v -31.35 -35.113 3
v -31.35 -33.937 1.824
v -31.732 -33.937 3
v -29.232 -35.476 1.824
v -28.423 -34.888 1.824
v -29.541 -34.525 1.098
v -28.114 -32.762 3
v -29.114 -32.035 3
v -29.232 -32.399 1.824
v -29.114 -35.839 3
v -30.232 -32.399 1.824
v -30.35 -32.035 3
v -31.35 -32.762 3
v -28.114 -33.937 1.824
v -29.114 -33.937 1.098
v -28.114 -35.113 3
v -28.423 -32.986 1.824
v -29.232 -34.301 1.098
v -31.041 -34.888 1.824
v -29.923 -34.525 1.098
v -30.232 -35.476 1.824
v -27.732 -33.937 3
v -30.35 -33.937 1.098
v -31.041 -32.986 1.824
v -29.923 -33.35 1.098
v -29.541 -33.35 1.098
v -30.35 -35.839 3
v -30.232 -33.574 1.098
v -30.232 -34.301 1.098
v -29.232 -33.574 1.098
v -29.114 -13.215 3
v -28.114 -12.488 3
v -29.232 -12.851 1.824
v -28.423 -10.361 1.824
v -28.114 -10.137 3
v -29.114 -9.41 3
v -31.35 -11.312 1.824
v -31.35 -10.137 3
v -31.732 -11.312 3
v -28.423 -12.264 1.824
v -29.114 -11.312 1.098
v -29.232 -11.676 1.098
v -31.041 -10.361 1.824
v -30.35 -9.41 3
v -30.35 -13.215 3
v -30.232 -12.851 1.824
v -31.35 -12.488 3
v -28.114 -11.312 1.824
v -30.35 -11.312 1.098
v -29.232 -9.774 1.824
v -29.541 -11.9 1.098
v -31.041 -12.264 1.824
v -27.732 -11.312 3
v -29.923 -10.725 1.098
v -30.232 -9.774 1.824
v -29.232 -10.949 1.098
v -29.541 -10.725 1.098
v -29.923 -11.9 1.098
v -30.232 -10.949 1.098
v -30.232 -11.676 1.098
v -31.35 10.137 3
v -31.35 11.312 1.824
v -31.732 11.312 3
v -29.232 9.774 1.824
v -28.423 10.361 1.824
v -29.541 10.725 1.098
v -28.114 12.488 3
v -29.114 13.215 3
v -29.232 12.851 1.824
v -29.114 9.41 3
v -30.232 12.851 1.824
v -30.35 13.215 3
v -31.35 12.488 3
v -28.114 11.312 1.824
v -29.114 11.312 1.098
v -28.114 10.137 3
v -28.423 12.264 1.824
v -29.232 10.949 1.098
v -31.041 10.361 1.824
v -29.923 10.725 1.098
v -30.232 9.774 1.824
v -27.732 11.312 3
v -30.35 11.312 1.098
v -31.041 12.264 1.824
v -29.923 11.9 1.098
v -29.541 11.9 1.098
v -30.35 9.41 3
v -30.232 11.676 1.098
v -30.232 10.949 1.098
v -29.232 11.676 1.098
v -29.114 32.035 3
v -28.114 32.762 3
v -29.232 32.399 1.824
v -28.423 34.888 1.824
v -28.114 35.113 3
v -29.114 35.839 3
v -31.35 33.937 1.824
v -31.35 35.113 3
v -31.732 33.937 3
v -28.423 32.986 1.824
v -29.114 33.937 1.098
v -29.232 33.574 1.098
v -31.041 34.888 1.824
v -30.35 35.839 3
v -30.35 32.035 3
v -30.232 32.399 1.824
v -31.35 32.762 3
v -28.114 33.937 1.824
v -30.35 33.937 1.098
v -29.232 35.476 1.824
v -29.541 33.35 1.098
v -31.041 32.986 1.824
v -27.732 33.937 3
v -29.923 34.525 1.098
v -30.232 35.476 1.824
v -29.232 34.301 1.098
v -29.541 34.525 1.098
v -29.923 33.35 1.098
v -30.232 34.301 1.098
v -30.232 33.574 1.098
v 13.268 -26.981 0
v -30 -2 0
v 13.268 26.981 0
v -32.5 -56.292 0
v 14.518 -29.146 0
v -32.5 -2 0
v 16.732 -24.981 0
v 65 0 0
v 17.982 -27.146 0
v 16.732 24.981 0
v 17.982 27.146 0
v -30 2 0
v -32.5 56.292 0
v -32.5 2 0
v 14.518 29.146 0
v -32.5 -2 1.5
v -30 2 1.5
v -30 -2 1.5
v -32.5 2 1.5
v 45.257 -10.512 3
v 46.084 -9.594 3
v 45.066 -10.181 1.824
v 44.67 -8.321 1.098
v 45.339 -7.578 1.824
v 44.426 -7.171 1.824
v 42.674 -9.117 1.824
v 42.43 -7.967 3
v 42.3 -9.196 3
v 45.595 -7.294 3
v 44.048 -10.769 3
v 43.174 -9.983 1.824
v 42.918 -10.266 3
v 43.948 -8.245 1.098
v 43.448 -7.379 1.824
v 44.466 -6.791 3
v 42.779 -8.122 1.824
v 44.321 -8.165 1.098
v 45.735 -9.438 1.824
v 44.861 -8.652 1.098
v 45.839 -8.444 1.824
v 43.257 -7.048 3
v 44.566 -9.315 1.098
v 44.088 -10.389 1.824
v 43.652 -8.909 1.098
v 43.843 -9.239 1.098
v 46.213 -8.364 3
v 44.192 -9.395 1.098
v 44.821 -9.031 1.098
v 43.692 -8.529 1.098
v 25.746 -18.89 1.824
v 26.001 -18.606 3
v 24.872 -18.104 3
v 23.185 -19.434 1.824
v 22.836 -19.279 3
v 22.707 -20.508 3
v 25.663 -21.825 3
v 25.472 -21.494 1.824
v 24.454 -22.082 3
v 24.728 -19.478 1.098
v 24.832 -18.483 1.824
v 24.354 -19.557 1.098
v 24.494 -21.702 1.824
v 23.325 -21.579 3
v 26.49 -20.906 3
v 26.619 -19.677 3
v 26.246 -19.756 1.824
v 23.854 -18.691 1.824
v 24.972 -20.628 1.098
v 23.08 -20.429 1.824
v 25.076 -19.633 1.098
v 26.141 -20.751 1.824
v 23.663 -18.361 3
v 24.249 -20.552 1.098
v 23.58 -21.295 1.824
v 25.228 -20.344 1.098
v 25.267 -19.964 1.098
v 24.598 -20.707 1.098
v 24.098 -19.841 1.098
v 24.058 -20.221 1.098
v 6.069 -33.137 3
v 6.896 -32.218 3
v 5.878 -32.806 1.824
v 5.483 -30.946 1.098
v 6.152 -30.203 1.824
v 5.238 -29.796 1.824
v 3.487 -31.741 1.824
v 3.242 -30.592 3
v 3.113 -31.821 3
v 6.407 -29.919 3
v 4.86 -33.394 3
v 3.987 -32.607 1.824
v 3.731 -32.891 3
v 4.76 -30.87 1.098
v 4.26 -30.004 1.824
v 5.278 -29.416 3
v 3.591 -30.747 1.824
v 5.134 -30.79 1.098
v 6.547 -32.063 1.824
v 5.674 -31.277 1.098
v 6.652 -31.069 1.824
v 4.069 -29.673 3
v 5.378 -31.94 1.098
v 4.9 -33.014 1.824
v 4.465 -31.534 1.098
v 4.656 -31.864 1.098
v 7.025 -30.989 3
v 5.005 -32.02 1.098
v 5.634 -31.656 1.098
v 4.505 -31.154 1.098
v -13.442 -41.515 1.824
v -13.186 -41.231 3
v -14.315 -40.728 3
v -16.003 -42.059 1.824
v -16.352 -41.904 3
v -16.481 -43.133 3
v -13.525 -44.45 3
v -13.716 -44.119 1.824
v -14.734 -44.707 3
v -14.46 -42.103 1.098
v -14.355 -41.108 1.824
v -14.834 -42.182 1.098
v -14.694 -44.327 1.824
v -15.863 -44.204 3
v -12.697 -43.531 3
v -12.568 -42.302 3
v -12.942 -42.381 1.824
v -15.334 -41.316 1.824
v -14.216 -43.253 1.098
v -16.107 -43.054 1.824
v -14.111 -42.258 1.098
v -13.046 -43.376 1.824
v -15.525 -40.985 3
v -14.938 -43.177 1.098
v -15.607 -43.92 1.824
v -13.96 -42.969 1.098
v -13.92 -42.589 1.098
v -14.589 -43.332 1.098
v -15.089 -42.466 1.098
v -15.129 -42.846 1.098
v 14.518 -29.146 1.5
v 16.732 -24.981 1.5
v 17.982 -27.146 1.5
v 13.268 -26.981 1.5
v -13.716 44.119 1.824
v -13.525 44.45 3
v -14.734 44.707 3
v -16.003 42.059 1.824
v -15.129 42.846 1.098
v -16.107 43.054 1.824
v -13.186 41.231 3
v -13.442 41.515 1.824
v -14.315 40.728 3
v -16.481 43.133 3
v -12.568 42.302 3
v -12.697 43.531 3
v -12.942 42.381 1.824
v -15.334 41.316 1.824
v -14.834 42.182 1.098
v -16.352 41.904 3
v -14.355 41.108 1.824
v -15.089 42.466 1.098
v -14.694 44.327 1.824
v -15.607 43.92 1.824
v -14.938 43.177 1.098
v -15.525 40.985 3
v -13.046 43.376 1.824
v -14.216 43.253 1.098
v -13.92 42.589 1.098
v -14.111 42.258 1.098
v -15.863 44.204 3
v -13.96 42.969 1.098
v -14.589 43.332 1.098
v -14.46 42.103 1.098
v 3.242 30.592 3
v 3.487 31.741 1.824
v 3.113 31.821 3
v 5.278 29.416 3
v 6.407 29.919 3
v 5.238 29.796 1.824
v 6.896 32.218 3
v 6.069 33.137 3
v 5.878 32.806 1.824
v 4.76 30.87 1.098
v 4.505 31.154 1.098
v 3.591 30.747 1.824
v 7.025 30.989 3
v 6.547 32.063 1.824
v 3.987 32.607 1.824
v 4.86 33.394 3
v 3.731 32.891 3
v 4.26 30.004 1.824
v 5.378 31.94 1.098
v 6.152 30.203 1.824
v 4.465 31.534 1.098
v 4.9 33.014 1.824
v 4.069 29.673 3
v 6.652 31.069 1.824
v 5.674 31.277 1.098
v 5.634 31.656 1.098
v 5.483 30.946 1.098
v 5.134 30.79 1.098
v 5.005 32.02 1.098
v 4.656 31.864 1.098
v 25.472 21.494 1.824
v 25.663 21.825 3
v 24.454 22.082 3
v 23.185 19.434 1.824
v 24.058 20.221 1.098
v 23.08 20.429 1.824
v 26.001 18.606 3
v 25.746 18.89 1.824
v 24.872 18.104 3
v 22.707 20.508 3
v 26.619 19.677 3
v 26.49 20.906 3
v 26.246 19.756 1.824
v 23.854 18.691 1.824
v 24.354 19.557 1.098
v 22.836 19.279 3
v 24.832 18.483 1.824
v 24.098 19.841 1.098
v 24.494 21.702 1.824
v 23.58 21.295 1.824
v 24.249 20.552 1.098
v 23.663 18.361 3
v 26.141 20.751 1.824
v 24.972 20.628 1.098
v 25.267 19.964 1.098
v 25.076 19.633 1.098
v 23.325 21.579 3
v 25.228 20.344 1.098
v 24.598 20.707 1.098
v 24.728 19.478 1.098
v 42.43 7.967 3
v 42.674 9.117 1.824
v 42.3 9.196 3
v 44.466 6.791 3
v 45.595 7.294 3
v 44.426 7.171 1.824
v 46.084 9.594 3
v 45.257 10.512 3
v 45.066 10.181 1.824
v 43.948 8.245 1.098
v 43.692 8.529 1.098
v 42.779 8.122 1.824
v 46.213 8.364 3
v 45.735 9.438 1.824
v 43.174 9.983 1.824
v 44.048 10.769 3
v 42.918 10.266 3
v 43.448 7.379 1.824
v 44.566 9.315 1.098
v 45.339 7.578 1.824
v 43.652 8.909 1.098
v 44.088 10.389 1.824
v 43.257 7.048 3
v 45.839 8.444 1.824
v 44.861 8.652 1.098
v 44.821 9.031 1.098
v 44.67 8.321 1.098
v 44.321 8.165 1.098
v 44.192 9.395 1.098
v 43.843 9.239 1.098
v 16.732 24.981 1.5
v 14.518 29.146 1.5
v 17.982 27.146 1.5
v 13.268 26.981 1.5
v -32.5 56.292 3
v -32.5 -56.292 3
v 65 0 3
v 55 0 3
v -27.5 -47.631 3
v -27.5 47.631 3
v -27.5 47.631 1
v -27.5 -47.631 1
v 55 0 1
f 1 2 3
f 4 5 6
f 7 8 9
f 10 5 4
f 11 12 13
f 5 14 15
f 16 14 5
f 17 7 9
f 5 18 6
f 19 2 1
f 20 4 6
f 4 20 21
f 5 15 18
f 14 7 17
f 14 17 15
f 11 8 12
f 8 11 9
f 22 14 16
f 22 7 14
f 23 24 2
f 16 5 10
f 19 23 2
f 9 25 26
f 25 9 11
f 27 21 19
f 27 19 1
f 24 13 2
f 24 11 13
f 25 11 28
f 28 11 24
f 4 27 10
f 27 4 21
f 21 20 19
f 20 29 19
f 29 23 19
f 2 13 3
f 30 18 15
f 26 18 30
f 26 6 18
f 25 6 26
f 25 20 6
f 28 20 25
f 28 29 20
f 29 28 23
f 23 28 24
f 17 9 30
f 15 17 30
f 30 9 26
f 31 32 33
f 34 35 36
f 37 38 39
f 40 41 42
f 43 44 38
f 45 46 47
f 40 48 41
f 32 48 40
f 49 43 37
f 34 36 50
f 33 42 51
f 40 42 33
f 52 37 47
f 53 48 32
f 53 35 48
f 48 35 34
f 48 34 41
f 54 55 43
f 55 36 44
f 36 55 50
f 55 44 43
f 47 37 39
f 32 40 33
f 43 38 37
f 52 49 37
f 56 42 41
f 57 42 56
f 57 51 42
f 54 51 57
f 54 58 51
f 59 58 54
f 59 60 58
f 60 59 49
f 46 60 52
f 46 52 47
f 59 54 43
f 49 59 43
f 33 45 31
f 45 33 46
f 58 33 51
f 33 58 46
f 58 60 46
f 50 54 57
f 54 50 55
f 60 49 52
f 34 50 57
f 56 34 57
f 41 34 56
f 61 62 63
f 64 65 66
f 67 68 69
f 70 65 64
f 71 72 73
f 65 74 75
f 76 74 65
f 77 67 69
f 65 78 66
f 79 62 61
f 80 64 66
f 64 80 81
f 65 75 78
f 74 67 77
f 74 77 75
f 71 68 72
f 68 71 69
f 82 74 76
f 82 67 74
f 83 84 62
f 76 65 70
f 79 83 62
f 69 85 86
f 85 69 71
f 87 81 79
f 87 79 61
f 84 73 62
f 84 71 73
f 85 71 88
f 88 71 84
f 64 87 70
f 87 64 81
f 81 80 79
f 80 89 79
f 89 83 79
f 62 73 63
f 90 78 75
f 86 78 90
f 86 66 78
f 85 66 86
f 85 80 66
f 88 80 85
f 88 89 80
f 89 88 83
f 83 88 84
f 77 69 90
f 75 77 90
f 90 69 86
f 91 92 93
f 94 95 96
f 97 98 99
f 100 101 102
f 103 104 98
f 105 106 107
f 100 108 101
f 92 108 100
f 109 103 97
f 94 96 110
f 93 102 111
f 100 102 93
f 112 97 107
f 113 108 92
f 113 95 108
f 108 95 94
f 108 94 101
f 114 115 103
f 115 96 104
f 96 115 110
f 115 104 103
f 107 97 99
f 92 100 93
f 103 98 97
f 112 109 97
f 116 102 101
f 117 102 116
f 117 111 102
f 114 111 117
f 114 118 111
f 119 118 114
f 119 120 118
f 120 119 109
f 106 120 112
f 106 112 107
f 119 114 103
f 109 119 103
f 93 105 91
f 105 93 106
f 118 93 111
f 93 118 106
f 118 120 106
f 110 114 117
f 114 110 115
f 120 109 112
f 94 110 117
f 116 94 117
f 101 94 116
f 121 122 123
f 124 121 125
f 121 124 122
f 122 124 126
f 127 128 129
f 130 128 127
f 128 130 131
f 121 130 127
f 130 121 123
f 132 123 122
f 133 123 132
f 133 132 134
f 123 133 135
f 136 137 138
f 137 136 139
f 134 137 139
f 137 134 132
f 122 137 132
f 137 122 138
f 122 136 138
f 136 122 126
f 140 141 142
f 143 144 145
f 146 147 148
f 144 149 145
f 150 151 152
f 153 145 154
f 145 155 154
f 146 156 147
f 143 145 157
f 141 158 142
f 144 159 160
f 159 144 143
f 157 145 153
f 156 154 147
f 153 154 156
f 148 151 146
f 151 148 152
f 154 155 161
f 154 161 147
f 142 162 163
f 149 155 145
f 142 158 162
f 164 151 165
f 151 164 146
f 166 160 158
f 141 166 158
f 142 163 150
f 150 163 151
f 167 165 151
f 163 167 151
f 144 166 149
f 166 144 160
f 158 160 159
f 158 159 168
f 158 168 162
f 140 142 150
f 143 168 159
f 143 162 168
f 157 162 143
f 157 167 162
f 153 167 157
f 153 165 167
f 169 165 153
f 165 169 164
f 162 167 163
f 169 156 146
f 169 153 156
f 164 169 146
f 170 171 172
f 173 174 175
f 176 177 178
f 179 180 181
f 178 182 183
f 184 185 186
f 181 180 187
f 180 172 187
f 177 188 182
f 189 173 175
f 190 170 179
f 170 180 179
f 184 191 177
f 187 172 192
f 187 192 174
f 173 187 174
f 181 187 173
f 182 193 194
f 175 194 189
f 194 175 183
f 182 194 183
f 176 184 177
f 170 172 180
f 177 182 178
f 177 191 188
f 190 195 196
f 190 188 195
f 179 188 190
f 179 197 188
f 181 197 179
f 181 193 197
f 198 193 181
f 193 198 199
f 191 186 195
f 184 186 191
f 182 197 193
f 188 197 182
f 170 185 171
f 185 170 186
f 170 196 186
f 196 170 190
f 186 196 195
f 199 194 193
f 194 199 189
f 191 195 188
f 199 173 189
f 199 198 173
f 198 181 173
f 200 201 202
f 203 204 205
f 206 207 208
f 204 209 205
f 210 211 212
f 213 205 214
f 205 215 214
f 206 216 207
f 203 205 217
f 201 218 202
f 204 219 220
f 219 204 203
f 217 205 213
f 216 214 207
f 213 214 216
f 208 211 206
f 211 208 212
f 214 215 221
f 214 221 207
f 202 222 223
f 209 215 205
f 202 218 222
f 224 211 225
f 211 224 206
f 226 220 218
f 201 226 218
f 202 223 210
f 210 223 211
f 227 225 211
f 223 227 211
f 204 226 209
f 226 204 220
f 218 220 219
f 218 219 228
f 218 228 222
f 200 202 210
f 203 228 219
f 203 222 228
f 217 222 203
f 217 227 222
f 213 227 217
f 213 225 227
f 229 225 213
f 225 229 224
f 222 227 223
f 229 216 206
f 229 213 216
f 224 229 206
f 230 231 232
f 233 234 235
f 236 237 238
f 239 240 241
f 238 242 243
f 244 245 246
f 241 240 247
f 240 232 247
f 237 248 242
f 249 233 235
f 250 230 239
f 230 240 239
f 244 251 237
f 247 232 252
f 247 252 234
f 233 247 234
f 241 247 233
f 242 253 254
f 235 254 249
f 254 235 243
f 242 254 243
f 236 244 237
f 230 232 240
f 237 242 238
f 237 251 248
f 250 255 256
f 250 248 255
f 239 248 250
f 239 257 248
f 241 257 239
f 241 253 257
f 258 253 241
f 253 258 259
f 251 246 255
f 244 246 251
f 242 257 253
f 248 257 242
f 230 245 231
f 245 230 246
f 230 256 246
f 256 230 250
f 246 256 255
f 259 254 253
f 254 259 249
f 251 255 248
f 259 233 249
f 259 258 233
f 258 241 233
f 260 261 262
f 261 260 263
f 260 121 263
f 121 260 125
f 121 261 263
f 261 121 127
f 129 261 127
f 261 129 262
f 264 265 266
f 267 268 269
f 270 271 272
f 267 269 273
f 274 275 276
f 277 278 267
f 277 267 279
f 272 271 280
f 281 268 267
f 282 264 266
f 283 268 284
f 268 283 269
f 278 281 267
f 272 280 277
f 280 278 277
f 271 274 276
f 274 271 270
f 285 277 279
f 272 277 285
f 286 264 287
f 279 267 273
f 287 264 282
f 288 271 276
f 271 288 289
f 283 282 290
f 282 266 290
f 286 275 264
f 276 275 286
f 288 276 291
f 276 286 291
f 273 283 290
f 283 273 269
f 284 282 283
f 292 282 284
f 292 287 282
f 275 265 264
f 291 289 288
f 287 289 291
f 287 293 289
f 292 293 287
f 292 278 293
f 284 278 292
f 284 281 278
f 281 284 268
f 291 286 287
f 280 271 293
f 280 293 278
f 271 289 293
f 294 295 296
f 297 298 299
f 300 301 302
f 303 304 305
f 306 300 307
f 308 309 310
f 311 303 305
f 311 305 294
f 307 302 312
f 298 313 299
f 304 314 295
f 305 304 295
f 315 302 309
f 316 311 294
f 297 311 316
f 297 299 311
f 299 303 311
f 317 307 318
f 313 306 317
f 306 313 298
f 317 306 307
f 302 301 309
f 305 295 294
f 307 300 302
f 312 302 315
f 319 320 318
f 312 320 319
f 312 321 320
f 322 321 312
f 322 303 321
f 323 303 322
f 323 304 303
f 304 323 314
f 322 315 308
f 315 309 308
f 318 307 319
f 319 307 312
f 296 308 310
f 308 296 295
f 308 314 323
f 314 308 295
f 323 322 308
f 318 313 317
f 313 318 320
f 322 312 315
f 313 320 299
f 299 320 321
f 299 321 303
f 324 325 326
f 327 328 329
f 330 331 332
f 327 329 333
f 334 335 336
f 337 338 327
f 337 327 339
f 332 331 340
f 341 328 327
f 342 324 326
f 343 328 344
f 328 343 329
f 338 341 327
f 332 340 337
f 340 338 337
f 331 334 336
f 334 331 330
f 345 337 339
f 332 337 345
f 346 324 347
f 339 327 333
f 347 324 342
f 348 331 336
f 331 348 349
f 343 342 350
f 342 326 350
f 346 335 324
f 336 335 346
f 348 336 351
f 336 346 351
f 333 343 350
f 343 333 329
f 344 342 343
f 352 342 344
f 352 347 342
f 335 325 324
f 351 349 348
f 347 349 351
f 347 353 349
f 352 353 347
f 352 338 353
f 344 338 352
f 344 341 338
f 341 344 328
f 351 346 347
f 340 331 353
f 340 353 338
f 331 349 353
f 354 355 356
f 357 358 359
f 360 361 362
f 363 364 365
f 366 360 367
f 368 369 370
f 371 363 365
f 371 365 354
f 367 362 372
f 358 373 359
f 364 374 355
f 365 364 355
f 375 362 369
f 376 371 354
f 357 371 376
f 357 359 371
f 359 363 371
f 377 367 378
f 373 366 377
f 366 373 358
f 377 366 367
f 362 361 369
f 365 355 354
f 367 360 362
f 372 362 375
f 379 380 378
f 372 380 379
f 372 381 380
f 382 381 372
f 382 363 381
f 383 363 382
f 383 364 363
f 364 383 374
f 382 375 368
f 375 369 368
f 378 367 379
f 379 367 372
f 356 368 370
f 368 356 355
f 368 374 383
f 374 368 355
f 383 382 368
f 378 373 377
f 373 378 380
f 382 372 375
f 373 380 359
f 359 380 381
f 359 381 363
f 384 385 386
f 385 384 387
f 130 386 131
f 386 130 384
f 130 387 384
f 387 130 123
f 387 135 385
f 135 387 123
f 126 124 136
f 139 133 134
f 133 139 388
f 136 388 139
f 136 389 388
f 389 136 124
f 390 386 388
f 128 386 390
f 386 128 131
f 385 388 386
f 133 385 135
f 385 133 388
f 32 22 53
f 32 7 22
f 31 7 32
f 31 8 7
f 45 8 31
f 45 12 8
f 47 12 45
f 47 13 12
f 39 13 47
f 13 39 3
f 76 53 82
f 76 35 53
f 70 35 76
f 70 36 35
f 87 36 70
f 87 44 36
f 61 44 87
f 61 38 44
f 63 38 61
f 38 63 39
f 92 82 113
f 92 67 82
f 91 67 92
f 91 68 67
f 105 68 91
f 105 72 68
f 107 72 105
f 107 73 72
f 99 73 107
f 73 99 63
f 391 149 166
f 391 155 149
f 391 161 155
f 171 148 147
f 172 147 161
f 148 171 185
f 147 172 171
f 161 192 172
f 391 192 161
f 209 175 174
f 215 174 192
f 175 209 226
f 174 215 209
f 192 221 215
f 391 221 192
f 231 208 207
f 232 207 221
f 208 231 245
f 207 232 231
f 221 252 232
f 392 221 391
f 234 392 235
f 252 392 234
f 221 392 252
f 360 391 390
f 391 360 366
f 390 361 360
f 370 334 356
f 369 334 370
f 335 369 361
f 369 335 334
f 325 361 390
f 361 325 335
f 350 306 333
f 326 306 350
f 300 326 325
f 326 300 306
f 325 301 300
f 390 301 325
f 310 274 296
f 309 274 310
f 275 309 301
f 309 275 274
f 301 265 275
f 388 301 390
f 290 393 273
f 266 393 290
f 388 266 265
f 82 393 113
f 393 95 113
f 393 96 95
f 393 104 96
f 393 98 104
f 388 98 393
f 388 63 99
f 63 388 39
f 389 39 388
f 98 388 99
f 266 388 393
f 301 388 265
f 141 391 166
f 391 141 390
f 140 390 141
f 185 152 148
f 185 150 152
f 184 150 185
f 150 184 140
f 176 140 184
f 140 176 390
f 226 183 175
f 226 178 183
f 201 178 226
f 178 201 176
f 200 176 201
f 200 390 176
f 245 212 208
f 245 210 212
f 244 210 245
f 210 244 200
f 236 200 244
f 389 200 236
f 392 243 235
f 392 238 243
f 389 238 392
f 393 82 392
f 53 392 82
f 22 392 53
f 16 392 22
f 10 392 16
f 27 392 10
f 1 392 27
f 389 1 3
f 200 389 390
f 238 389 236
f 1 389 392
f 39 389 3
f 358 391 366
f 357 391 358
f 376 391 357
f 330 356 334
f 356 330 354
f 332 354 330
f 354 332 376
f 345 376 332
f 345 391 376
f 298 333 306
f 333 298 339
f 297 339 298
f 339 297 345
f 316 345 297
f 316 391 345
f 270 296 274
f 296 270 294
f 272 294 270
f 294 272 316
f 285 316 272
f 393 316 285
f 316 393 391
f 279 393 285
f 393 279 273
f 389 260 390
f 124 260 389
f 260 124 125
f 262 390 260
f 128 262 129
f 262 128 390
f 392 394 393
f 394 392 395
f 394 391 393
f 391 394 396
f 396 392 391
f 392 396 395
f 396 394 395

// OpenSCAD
$size = 70;
$inner_size = $size - 15;
$piece_size = ($inner_size / 4) * 0.95;
$piece_length = $piece_size*3 / sqrt(3);


module nib() {
  translate([-(($size/2)-3.5),0,0]) {
   # linear_extrude(1.5) {
      square([3,4], true);
    }
  }
}

module divet() {
  translate([-($piece_size) / ($size/20),0,3]) {  
    sphere(2, $fn=10);
  }
}

module divet_row() {
  for(i=[-1.5,-0.5, 0.5, 1.5]) {
    translate([-($inner_size/2)+1.5,$piece_length * i, 0]) {
      divet();
    }
  }
}


module base() {
  cylinder(h = 3,
         r1 = $size - 5,
         r2 = $size - 5,
         $fn = 3);
}
    
difference() {
  base();
  
  translate([0,0,1]) {
    cylinder(h = 20,
             r1 = $inner_size,
             r2 = $inner_size,
             $fn = 3);
  }
  
  for(i=[0,120,240]) {
    rotate([0,0,i]) {
        divet_row();
        nib();
    }
  }
  

} 
